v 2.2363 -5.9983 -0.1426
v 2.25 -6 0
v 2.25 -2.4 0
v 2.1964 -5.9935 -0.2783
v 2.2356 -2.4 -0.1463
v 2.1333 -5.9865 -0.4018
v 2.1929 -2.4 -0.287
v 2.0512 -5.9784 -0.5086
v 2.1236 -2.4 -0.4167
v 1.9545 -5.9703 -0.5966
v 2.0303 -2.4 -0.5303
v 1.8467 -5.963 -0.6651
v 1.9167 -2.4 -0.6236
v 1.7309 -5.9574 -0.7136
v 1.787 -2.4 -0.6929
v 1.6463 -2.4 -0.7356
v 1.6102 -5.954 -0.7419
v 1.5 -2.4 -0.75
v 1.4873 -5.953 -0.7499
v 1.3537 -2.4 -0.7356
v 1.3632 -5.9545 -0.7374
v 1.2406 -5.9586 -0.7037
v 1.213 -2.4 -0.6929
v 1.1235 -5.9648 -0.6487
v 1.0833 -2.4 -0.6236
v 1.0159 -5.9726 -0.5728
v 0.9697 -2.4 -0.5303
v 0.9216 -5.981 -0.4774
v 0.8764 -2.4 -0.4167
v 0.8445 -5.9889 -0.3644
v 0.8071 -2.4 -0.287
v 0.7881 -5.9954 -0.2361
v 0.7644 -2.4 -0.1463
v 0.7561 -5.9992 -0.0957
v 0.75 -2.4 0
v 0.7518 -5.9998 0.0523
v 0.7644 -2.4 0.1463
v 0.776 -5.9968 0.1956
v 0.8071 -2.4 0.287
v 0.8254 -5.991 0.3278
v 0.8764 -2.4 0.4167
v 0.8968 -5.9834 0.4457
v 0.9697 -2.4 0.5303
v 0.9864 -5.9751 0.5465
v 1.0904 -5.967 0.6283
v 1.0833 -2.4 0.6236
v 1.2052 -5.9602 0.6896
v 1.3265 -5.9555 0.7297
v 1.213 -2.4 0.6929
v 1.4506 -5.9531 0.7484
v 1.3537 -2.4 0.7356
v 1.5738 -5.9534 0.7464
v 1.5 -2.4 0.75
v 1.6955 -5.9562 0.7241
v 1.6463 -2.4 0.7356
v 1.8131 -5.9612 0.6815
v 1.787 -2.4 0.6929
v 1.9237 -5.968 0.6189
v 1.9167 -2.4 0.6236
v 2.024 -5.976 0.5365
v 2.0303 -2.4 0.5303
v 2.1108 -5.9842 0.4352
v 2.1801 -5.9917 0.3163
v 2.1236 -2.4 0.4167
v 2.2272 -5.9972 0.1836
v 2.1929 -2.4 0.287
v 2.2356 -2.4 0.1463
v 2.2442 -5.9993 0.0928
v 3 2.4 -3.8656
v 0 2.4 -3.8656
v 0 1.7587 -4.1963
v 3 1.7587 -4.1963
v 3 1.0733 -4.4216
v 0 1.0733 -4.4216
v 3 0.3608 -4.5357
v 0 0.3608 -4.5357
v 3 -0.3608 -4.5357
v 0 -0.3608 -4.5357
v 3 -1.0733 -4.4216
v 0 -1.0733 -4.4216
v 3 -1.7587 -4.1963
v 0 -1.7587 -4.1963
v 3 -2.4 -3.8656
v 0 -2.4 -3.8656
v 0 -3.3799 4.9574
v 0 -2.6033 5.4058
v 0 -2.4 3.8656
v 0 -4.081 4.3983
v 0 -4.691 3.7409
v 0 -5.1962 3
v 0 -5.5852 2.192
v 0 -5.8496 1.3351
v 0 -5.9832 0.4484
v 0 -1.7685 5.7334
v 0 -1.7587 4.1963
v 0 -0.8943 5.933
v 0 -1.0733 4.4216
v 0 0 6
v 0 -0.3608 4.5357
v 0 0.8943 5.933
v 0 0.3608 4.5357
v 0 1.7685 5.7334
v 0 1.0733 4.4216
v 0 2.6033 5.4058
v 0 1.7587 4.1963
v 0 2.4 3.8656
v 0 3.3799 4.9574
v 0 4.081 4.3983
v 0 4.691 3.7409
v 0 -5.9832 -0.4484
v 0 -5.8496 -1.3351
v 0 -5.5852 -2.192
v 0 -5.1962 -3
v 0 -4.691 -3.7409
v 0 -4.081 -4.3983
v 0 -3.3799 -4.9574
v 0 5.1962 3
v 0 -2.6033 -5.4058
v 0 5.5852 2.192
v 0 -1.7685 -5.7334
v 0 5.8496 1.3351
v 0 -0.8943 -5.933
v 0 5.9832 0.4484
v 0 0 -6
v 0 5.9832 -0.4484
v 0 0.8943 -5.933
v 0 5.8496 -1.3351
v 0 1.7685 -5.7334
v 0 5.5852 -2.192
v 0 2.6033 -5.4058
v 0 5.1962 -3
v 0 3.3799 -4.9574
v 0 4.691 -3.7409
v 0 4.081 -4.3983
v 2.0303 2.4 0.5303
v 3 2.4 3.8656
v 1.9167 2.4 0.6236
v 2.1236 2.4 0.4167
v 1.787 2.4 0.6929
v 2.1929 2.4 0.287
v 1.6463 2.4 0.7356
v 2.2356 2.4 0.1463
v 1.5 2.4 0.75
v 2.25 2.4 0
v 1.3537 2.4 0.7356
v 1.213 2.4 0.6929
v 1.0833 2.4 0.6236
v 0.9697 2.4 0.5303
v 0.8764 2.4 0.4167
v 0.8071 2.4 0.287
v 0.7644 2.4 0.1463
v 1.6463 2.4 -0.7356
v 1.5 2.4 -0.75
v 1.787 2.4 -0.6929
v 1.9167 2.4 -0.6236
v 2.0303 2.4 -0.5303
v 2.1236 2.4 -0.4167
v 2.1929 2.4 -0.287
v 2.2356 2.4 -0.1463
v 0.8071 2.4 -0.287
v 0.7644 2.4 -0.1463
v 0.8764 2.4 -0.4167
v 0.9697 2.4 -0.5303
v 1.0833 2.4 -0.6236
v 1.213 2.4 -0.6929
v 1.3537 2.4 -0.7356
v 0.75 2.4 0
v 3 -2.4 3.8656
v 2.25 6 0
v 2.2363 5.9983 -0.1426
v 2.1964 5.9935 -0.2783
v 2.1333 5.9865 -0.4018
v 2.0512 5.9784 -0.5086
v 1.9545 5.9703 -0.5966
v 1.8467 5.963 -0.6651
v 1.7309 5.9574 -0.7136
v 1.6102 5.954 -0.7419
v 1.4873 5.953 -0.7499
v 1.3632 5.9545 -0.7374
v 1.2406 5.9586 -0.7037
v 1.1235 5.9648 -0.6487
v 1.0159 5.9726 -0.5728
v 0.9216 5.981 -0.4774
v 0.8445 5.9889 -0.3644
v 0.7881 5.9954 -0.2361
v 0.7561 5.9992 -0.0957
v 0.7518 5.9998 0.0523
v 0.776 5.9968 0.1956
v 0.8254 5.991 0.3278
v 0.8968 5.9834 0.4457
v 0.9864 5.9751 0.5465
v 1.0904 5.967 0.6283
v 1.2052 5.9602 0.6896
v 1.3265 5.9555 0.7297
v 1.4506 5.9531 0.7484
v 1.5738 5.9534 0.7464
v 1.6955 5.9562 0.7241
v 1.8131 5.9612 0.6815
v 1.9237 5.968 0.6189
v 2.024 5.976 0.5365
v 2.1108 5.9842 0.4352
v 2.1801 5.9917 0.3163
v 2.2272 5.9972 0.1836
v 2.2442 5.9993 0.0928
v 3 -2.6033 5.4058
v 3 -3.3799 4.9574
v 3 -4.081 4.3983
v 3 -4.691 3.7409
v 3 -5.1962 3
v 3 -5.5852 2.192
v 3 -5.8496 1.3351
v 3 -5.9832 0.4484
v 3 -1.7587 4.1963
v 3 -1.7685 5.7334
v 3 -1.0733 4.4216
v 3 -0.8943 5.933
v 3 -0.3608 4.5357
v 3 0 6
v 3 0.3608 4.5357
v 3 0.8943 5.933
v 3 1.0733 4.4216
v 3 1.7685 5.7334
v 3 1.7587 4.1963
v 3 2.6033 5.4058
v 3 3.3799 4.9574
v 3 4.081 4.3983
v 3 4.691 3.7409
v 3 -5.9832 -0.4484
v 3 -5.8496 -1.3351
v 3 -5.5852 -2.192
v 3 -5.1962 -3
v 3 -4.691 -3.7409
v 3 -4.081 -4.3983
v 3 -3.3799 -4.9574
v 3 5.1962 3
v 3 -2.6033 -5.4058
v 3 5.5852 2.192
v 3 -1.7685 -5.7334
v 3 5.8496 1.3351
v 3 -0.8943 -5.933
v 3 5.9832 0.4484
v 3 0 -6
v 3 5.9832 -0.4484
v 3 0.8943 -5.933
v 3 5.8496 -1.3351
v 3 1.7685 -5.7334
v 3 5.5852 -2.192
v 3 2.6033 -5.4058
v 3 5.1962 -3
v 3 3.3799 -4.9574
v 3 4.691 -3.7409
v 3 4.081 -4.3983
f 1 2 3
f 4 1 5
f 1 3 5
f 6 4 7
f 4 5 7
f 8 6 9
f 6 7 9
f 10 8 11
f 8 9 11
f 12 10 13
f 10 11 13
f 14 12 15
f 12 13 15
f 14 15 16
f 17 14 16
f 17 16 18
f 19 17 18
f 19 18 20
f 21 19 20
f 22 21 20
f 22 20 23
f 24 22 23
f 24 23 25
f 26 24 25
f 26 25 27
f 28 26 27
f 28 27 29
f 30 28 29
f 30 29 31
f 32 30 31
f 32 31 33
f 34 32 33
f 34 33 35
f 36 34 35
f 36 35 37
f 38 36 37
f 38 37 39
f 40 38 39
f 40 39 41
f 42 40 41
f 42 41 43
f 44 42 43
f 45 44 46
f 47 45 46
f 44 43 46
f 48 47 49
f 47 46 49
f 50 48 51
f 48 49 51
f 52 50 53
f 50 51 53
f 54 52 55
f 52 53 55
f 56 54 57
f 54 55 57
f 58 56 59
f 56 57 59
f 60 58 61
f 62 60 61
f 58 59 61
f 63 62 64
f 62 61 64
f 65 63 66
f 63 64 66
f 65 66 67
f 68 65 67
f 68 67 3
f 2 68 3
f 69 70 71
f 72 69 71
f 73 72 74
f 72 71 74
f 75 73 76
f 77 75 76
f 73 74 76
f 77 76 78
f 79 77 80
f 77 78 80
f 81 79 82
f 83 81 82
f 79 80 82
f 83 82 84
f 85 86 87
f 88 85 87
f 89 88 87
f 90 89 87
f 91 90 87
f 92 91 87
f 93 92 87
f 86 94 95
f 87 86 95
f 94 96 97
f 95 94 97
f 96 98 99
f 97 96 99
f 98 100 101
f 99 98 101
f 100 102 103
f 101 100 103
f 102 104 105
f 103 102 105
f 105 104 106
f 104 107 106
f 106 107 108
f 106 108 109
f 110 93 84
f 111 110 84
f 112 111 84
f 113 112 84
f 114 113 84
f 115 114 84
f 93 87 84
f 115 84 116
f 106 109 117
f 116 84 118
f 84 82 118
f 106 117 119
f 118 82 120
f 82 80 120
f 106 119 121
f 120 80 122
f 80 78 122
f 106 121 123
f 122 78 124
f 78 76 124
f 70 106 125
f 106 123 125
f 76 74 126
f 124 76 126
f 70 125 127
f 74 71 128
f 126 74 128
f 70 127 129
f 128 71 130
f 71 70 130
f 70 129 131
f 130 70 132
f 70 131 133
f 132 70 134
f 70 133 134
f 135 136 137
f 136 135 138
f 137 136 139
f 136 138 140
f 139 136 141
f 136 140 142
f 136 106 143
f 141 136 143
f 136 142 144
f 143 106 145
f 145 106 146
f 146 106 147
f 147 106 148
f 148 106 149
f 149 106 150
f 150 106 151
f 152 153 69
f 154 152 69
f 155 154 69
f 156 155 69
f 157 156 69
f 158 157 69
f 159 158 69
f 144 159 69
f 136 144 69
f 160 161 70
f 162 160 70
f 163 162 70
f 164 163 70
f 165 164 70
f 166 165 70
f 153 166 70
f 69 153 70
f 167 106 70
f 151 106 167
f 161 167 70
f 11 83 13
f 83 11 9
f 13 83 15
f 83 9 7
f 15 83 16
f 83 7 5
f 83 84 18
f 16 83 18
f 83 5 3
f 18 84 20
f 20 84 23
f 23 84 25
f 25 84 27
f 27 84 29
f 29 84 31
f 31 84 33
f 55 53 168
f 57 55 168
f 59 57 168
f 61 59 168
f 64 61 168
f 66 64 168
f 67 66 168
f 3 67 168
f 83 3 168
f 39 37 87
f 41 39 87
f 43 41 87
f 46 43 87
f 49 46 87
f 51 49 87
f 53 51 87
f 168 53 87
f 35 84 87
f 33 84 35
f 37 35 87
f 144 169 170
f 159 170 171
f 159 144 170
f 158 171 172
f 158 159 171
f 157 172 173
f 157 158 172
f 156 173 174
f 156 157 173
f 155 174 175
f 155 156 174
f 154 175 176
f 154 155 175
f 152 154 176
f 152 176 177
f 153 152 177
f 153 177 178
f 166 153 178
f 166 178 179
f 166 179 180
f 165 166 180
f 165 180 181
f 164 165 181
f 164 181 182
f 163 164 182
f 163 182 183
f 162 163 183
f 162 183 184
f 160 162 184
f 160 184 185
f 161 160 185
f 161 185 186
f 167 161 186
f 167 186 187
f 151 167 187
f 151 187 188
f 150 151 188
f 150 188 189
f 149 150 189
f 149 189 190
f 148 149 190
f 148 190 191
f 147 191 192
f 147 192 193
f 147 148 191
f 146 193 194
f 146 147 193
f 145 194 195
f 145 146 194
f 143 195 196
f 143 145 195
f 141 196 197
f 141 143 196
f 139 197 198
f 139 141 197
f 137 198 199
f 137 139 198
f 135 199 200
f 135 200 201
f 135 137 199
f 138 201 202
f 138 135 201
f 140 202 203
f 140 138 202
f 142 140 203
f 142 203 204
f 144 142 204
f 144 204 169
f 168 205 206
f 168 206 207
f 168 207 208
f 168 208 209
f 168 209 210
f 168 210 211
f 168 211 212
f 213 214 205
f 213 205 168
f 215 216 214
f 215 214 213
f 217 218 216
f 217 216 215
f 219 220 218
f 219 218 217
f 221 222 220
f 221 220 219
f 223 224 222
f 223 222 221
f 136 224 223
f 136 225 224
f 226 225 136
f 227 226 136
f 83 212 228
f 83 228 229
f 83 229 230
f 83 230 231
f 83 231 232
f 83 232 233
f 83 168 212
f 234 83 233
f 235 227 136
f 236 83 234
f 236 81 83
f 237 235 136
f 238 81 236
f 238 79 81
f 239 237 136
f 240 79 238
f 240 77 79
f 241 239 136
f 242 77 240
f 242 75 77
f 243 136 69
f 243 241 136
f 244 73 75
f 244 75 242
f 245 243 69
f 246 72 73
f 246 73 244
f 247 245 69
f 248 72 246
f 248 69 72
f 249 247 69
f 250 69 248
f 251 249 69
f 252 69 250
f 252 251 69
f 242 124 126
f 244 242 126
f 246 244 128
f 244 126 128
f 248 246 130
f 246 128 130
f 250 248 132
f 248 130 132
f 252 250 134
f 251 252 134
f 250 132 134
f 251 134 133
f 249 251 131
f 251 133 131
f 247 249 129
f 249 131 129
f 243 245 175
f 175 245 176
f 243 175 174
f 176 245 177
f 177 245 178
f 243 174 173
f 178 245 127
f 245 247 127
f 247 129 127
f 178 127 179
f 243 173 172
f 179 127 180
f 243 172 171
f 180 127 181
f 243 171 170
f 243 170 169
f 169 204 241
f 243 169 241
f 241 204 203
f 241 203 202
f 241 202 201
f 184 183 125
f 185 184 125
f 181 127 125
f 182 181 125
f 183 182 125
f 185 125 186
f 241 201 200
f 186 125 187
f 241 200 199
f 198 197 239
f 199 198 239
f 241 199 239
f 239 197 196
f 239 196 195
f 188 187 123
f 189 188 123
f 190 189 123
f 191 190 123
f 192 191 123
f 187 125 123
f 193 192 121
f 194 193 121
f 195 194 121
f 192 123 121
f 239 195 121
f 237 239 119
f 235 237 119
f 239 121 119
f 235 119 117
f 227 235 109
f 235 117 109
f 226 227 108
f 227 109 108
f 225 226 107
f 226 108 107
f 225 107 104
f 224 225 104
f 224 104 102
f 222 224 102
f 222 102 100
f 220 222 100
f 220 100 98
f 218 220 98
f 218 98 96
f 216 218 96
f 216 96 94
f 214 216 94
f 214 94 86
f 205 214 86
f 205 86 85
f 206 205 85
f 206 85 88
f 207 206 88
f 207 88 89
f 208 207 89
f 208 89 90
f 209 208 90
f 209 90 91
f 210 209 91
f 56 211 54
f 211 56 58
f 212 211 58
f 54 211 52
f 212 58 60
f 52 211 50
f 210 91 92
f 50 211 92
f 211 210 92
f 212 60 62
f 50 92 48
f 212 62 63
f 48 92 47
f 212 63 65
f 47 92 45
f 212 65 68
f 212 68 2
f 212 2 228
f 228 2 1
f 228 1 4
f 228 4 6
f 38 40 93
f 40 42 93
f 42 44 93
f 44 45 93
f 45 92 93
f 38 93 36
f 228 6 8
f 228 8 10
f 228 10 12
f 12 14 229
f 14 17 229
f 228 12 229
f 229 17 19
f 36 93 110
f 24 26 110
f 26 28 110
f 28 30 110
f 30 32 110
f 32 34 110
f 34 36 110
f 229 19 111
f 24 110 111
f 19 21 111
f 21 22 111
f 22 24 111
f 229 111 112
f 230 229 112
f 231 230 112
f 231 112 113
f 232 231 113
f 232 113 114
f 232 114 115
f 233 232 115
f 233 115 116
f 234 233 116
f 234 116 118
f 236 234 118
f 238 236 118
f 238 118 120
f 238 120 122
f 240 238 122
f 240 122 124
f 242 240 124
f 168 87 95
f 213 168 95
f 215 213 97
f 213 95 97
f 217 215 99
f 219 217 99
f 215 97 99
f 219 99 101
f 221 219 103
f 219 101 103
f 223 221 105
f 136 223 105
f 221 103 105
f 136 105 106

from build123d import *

# Parameters (mm, degrees)
SKETCH1_R               = 6
BOSS_EXTRUDE1_DEPTH     = 3
SKETCH2_R               = 0.75
CUT_EXTRUDE1_DEPTH      = 9.4
CUT_EXTRUDE1_DEPTH_BACK = 4.6


with BuildPart() as part:
    # Sketch1 → Boss-Extrude1 (new body)
    with BuildSketch(Plane(origin=(0, 0, 0), x_dir=(0, 0, -1), z_dir=(1, 0, 0))):
        Circle(SKETCH1_R)
        with BuildLine():
            Line((-3.865553001, 2.4), (3.865553001, 2.4))
            ThreePointArc((3.865553001, 2.4), (4.55, 0), (3.865553001, -2.4))
            Line((3.865553001, -2.4), (-3.865553001, -2.4))
            ThreePointArc((-3.865553001, -2.4), (-4.55, 0), (-3.865553001, 2.4))
        make_face(mode=Mode.SUBTRACT)
    extrude(amount=BOSS_EXTRUDE1_DEPTH)

    # Sketch2 → Cut-Extrude1 (cut, two sides)
    with BuildSketch(Plane(origin=(0, -2.4, 0), x_dir=(1, 0, 0), z_dir=(0, 1, 0))) as cut_extrude1_sk:
        with Locations((1.5, 0)):
            Circle(SKETCH2_R)
    extrude(amount=CUT_EXTRUDE1_DEPTH, mode=Mode.SUBTRACT)
    extrude(cut_extrude1_sk.sketch, amount=-CUT_EXTRUDE1_DEPTH_BACK, mode=Mode.SUBTRACT)


solid = part.part
